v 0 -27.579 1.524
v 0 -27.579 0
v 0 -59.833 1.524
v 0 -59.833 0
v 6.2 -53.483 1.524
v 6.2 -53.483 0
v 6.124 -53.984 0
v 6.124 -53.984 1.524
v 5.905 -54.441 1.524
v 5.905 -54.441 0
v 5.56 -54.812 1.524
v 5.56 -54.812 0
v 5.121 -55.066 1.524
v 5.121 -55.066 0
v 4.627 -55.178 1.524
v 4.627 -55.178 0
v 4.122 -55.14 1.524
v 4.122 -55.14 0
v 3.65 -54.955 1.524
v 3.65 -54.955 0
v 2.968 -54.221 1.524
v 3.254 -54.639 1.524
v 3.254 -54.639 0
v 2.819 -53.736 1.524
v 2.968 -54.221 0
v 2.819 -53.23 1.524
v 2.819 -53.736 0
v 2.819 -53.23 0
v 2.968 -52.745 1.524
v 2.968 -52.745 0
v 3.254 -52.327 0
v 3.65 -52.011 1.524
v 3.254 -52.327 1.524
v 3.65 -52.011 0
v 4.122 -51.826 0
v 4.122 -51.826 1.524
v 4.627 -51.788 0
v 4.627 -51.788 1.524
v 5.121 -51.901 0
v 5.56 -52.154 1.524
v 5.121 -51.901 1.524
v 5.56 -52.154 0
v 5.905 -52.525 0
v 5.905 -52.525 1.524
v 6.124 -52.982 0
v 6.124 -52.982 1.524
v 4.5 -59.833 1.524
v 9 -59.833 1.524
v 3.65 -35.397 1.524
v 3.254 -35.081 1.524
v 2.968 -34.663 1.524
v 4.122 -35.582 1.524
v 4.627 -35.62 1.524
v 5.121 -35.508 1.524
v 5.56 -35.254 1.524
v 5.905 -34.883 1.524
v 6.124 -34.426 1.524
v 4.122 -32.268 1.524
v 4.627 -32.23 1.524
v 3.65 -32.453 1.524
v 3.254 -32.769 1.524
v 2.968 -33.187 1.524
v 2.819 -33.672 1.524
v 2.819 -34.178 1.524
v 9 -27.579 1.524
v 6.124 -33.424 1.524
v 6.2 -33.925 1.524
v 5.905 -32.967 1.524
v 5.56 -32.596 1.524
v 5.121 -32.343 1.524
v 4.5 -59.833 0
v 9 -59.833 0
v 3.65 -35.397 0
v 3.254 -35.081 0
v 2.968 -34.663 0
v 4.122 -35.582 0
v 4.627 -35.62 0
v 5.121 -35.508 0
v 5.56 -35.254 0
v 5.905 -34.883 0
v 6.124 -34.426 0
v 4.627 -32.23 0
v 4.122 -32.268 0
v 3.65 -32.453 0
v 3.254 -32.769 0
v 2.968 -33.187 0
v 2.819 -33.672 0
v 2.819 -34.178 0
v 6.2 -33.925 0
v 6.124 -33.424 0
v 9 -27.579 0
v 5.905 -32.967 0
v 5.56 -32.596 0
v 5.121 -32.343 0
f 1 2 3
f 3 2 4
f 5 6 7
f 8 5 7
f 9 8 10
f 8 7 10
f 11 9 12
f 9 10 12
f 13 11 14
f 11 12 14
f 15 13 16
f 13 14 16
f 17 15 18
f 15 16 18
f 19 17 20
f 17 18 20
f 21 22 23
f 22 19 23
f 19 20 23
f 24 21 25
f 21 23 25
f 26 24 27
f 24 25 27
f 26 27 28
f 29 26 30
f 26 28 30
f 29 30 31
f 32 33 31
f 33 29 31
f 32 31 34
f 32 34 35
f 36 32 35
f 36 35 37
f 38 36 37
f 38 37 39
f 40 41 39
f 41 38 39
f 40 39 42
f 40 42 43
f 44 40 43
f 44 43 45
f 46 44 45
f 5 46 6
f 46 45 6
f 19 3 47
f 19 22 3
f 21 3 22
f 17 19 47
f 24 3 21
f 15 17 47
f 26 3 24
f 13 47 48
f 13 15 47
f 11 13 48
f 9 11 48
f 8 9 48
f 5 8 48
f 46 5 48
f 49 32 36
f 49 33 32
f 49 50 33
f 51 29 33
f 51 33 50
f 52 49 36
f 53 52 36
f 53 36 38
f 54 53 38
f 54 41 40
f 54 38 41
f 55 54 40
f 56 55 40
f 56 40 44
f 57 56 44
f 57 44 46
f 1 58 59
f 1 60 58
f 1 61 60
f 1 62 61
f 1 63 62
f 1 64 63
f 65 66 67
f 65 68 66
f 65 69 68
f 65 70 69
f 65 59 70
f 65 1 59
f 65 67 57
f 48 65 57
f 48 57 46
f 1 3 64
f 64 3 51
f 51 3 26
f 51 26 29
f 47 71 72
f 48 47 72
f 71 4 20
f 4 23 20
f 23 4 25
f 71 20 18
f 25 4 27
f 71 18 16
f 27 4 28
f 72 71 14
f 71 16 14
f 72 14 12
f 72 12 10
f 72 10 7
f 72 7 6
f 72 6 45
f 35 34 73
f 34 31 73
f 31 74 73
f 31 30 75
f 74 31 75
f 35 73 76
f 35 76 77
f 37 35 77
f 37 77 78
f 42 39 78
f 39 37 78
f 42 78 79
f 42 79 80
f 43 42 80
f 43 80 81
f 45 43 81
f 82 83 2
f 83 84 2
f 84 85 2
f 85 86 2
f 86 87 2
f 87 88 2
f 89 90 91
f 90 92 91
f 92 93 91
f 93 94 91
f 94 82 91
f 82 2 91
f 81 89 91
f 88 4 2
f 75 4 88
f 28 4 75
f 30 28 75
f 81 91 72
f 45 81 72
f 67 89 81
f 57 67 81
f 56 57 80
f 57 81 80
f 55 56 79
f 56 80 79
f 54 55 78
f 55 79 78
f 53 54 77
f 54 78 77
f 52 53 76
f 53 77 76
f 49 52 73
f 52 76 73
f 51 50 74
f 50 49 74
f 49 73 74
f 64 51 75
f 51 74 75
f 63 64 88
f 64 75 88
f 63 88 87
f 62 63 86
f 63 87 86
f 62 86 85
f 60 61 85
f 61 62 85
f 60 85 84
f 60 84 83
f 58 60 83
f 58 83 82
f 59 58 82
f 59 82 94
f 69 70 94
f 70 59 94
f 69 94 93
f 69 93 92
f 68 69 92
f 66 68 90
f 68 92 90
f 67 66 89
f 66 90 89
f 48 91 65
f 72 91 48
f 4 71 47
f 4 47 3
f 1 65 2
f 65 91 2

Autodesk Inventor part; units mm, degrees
ref_plane "YZ Plane" through (0, 0, 0) normal (1, 0, 0) x (0, 1, 0)
ref_plane "XZ Plane" through (0, 0, 0) normal (0, 1, 0) x (-1, 0, 0)
ref_plane "XY Plane" through (0, 0, 0) normal (0, 0, 1) x (1, 0, 0)
ref_plane "Work Plane1" through (0, -0.0041, 0) normal (0, 0, 1) x (1, 0, 0)
sketch "Sketch1" plane through (0, -0.0041, 0) normal (0, 0, 1) x (1, 0, 0)
  line L0 (0, -194.9959) -> (0, 0.0041) construction
  line L1 (9, 0.0041) -> (9, -194.9959) construction
  circle A0 centre (4.5, -53.479) radius 1.7 construction
  circle A1 centre (4.5, -33.921) radius 1.7 construction
  circle A2 centre (4.5, -53.479) radius 1.7
  circle A3 centre (4.5, -33.921) radius 1.7
  line L2 (4.5, -53.479) -> (4.5, -59.829) construction
  line L3 (4.5, -33.921) -> (4.5, -27.571) construction
  line L4 (9, -27.5751) -> (0, -27.5751)
  line L5 (4.5, -59.829) -> (9, -59.829)
  line L6 (9, -27.5751) -> (9, -59.829)
  line L7 (4.5, -59.829) -> (0, -59.829)
  line L8 (0, -27.5751) -> (0, -59.829)
  dimension "d0" = 6.35
  dimension "d1" = 6.35
extrude "Extrusion1" add sketch "Sketch1" along normal blind 1.524
properties part number "standoff for gripper servo"
